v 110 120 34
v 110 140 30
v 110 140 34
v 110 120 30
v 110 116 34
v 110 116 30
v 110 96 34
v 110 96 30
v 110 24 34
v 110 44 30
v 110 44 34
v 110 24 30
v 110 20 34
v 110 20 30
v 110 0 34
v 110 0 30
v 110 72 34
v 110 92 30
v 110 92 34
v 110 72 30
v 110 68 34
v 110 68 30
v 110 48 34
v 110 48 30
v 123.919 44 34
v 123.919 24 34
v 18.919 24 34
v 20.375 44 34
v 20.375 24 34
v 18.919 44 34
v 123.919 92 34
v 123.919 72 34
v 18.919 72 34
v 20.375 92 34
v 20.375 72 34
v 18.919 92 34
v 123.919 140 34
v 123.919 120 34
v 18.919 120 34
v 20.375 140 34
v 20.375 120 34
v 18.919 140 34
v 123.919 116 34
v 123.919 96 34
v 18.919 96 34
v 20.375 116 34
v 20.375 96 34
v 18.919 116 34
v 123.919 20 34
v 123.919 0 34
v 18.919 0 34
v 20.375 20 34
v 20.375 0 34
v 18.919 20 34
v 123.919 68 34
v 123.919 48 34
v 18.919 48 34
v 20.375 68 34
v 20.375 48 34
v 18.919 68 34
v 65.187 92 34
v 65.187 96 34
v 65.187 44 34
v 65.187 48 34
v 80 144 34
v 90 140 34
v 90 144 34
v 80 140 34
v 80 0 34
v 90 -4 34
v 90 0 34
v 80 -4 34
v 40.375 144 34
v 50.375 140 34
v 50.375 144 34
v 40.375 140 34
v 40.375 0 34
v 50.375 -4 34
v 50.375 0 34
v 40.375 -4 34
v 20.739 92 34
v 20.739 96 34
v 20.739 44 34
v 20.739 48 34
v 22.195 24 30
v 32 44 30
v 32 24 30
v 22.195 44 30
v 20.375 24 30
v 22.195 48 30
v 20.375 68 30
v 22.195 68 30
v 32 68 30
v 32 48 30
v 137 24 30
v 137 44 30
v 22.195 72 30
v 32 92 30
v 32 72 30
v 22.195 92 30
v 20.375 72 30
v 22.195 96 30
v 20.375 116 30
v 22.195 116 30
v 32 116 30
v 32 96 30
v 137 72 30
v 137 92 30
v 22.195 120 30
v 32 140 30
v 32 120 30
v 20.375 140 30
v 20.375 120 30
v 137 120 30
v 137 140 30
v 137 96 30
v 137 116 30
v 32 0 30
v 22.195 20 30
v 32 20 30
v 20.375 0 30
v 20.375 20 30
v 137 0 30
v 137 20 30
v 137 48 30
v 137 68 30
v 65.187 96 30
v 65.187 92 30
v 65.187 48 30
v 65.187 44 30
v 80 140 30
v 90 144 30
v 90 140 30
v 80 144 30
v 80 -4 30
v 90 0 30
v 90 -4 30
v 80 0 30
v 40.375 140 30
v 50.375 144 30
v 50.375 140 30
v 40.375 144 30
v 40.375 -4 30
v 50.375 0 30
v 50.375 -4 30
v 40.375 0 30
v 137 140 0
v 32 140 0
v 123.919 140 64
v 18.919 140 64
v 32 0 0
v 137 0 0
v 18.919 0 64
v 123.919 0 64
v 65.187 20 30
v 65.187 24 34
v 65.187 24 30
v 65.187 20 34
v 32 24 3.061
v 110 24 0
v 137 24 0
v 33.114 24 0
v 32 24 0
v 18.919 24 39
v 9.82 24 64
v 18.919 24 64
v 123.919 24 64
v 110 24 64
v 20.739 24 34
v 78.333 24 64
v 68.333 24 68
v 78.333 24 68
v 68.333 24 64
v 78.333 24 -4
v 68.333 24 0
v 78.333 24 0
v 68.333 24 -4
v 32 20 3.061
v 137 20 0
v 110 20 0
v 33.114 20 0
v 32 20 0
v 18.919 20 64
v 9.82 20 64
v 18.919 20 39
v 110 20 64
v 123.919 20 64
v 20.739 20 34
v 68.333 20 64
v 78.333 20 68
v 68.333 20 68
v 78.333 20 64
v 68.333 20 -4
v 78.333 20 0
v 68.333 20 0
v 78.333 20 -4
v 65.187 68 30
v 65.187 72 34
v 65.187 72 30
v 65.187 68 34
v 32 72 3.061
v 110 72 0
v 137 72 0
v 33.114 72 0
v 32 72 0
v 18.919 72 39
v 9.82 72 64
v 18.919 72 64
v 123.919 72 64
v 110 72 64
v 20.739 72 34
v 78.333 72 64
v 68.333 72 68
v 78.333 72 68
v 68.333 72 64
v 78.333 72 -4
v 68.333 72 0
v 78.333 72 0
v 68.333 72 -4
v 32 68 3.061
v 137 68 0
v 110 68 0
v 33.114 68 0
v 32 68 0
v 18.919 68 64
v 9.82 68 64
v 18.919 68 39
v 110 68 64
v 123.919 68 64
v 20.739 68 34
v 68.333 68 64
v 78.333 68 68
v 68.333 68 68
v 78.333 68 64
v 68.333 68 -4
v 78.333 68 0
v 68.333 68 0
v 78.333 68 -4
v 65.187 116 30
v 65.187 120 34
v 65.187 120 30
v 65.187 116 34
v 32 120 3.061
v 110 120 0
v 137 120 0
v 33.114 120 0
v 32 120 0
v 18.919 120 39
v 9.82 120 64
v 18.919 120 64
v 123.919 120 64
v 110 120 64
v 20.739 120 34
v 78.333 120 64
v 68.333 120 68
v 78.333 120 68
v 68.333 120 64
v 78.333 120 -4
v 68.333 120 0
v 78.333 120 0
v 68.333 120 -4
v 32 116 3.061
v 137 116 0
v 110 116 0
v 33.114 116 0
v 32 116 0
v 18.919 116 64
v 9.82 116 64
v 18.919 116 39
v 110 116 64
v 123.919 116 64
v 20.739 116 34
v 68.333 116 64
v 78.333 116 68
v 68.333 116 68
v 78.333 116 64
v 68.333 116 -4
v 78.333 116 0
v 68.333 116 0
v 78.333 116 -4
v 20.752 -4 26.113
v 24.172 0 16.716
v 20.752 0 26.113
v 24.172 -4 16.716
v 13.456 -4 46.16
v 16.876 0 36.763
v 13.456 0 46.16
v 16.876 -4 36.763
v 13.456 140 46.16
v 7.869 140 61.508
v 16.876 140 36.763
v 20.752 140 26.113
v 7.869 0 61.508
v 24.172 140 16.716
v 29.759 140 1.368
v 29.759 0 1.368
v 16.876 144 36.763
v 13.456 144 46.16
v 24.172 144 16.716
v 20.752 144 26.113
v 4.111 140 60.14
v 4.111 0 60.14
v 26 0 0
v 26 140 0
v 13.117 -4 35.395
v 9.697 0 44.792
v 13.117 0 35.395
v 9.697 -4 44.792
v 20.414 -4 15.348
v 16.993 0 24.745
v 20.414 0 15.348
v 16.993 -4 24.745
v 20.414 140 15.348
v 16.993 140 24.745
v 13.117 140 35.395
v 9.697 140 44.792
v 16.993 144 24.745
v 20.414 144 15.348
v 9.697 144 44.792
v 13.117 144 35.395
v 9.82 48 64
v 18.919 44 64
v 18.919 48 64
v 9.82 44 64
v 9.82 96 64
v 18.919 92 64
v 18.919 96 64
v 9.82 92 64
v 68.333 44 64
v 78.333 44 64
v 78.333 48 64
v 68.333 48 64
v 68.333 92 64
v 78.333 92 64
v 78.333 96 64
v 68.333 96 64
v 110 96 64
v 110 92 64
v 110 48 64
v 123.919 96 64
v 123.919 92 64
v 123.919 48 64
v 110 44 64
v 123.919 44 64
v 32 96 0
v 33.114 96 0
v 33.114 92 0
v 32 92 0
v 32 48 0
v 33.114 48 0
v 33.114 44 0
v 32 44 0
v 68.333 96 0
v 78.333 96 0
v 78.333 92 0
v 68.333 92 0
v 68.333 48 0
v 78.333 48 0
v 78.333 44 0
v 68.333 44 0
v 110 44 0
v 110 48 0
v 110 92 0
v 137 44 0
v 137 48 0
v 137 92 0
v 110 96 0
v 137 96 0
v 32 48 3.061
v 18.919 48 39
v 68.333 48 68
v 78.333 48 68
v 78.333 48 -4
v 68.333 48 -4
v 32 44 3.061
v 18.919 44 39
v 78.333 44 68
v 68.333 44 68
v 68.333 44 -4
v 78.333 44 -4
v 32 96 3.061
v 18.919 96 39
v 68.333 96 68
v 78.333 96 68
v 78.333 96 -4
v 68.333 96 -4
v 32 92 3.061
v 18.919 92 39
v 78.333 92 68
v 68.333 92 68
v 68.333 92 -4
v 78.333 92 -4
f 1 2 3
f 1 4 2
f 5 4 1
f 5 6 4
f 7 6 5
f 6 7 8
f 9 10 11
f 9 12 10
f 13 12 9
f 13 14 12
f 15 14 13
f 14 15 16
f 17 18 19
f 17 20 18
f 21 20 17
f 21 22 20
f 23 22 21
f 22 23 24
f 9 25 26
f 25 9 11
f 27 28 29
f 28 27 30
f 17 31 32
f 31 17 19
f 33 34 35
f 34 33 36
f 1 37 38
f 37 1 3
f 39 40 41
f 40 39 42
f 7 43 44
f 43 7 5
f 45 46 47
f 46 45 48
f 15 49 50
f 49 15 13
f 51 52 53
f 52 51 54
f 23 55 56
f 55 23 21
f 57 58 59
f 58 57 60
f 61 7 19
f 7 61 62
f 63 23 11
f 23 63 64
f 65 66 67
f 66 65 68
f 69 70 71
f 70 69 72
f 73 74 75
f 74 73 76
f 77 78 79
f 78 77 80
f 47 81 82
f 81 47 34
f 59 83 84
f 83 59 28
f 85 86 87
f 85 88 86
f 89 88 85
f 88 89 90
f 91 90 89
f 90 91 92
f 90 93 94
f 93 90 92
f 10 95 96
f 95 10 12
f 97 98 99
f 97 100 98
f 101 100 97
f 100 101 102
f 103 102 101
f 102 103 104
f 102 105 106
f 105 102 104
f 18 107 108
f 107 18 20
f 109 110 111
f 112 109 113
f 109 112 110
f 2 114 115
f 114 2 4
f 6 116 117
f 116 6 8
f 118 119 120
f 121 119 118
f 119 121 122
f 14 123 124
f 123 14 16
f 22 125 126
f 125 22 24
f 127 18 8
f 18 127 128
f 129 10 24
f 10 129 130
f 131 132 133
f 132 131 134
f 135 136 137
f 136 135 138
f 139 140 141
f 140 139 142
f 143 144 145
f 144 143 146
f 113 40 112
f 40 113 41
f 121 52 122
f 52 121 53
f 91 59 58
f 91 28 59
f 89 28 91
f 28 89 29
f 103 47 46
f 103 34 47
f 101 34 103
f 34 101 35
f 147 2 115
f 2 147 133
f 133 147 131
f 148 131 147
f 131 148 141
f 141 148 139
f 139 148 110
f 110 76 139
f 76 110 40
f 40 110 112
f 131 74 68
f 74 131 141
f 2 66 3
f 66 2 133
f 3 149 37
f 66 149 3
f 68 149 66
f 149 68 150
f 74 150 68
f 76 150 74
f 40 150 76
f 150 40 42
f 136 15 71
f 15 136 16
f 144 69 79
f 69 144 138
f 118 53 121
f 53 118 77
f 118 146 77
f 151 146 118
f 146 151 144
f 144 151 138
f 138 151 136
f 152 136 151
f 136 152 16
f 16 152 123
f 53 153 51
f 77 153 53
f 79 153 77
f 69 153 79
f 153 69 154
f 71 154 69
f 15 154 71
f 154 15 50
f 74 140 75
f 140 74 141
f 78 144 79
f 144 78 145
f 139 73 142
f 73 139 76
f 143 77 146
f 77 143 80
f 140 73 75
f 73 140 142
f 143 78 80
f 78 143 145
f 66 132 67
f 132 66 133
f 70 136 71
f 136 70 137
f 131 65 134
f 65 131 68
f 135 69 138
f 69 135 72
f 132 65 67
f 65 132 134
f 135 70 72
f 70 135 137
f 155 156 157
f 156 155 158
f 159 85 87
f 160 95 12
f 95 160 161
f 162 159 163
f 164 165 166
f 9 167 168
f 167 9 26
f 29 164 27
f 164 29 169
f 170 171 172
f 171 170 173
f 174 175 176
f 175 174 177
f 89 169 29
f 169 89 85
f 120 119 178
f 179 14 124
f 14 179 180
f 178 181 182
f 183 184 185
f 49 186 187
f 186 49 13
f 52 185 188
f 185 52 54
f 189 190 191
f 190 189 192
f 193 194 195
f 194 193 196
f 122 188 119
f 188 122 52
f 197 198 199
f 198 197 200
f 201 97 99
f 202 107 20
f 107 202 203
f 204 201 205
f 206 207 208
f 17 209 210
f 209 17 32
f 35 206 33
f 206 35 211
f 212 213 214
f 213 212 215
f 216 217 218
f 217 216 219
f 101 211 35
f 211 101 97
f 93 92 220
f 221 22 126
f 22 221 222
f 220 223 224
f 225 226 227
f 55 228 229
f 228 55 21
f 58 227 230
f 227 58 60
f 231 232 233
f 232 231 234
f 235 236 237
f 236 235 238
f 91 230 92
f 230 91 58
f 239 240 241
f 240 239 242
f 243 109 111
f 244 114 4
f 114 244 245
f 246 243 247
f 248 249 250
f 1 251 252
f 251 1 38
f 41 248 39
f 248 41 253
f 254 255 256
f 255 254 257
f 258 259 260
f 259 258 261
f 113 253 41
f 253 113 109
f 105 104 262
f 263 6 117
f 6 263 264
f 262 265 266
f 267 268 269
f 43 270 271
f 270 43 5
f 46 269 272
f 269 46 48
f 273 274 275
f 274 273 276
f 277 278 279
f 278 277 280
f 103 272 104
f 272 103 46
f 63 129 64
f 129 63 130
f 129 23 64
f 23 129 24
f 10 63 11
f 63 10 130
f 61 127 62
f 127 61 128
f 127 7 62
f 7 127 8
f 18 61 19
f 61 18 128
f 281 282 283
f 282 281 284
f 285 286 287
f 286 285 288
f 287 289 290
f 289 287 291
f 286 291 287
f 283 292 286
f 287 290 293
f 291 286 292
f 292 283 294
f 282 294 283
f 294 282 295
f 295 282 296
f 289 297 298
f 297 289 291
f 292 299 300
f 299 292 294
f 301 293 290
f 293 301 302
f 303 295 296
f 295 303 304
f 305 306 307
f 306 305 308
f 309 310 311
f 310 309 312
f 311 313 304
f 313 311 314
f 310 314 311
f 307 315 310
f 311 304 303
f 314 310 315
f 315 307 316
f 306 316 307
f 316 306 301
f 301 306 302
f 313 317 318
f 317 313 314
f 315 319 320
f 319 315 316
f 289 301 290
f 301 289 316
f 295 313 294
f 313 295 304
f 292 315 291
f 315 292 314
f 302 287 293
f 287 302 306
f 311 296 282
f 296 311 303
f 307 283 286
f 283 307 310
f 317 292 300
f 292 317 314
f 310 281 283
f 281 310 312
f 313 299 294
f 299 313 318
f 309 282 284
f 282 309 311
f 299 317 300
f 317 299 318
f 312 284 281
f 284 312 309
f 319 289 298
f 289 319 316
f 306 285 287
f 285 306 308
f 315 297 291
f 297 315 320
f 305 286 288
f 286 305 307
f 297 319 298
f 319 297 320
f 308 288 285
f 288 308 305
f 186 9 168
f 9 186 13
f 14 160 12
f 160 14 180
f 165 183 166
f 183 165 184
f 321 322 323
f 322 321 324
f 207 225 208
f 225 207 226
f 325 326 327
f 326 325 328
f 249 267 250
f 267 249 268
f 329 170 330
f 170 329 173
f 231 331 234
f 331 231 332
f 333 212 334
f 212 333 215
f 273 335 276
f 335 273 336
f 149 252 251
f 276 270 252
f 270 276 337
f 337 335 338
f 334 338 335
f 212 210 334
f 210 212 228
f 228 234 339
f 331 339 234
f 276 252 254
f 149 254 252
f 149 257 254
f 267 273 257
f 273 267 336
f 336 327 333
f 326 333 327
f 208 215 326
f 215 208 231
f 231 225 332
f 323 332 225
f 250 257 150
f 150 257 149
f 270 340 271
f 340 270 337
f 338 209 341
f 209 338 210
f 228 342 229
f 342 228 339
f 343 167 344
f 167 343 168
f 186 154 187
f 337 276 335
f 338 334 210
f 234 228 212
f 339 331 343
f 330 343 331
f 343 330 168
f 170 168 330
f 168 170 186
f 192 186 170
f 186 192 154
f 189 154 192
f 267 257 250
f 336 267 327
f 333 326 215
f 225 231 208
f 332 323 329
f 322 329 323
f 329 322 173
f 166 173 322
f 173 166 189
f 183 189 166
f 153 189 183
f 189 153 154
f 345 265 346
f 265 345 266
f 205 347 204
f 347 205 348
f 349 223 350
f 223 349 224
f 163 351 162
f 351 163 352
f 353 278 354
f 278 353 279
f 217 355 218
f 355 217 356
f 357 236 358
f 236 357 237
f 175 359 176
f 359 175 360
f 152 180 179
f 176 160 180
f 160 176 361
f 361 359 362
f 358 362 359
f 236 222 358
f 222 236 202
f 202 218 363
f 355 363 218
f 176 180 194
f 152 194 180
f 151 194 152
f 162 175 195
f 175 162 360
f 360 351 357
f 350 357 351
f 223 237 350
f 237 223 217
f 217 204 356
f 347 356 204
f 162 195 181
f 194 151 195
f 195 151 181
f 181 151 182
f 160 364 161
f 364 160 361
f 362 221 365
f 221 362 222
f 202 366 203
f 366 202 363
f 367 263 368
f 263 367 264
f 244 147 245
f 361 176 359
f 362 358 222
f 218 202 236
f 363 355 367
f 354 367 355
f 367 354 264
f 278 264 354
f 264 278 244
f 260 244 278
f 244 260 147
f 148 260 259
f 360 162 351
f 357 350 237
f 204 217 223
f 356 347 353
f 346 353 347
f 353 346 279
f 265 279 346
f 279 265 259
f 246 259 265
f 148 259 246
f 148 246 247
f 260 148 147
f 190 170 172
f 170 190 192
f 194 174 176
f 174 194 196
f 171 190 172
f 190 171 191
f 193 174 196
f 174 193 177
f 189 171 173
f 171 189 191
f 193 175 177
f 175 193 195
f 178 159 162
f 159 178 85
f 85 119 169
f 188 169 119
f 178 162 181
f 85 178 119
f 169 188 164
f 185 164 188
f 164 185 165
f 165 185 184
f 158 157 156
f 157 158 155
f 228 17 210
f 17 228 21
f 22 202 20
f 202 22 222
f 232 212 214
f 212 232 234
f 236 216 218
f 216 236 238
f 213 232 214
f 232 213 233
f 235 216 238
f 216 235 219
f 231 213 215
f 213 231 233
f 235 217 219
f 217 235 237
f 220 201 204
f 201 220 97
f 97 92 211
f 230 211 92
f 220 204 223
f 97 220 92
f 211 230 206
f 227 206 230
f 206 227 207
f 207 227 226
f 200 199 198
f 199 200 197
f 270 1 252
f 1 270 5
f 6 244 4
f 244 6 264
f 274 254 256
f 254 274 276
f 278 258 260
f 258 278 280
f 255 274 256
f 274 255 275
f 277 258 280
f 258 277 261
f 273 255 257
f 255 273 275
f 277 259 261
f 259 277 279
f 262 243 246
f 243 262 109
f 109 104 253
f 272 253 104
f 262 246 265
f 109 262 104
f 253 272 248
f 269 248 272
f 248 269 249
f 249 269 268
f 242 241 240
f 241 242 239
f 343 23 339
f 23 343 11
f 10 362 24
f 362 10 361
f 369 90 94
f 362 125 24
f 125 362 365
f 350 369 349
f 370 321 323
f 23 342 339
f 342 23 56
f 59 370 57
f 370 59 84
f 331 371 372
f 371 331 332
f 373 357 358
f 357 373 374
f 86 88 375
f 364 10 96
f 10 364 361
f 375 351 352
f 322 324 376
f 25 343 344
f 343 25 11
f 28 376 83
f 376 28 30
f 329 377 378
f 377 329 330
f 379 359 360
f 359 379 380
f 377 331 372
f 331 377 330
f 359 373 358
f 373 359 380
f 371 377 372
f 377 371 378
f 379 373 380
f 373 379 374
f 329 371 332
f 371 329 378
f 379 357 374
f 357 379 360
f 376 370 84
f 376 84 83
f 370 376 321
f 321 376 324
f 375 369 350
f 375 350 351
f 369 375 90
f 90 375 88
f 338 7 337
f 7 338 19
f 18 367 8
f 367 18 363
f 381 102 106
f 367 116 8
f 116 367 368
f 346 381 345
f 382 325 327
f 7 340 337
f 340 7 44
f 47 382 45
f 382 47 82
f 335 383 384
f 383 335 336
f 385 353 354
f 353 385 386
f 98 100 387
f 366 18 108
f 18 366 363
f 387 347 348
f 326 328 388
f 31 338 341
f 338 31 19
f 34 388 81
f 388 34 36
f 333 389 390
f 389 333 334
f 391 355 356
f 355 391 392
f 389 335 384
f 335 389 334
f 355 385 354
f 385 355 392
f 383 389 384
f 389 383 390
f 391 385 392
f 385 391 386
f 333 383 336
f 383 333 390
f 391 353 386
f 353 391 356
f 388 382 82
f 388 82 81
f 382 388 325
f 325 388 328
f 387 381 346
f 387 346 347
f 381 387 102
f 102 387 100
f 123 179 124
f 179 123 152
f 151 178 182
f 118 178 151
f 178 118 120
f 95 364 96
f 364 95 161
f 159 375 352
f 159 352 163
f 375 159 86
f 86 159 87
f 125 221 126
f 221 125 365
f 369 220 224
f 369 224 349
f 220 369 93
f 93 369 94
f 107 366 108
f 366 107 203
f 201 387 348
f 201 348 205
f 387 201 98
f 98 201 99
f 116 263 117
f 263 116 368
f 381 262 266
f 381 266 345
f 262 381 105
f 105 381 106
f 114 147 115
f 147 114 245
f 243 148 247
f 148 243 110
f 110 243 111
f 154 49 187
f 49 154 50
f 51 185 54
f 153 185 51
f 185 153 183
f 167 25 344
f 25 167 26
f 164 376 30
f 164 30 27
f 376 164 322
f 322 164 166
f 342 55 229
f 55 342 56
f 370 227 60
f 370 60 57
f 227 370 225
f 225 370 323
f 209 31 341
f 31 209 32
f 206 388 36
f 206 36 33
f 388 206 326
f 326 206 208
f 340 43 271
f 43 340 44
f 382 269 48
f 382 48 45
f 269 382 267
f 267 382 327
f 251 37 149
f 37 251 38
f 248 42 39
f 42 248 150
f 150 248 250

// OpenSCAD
// file: dimensions.scad
$thick_gap = 20;
$height_gap = 30;
$material_thickness = 4;
$slant_angle = 20;
$insideHeight = 110;
$outsetMargin = 10;
// file: box-inset.scad
include <./dimensions.scad>

// inside-slant offset -> 
offset = 8 + ($height_gap + $material_thickness) / tan (90-$slant_angle);
margin = 5;

insideWidth = 6 * $thick_gap + 5 * $material_thickness;

module horizontalPlank(height) {
  offsetted_height = height - offset;
  difference () {
    union() {
      //base
      cube([offsetted_height, insideWidth, $material_thickness]);
      // first set of wings
      translate([20, - $material_thickness, 0])
        cube([10, insideWidth + 2 * $material_thickness, $material_thickness]);
      // second set of wings
      translate([offsetted_height - 30, - $material_thickness, 0])
        cube([10, insideWidth + 2 * $material_thickness, $material_thickness]);
    }
    // first set of knotches
    for (i=[0:2]) {
      translate([- margin, $thick_gap + (i * 2 * ($thick_gap + $material_thickness)), - margin ])
        cube([offsetted_height / 2 + margin, $material_thickness, 2*margin +  $material_thickness]);
    }
    // second set of knotches
    for (i=[0:1]) {
      translate([offsetted_height / 2, 2 * $thick_gap + $material_thickness + (i * 2 * ($thick_gap + $material_thickness)), - margin ])
        cube([offsetted_height / 2 + margin, $material_thickness, 2*margin + $material_thickness]);
    }
  }
}

module insideSlant() {
  slantHeight = 2 * $height_gap + $material_thickness;
  union() {
    cube([$material_thickness, insideWidth, slantHeight]);
    translate([0, - $material_thickness, (slantHeight / 3) - 5])
    cube([$material_thickness, insideWidth + 2 * $material_thickness, 10]);
    translate([0, - $material_thickness, 2 * (slantHeight / 3) - 5])
    cube([$material_thickness, insideWidth + 2 * $material_thickness, 10]);
  }
}

module verticalSeparator(height, front_knotch = true) {
  offsetted_height = height - offset;
  separatorWidth = 2 * $height_gap + $material_thickness;

  base = 8 + margin;
  bottomOffset = base + (separatorWidth + 2 * margin) / tan(90-$slant_angle);

  // wedge cutout
  wedgePoints = [
    [0, 0, separatorWidth + 2 * margin], // 0
    [base, 0, separatorWidth + 2 * margin], // 1
    [bottomOffset, 0, 0], // 2
    [0, 0, 0], // 3
    [0, $material_thickness + 2 * margin, separatorWidth + 2 * margin], // 4
    [base, $material_thickness + 2 * margin, separatorWidth + 2 * margin], // 5
    [bottomOffset, $material_thickness + 2 * margin, 0], // 6
    [0, $material_thickness + 2 * margin, 0] // 7
  ];
  wedgeFaces = [
    [4, 5, 1, 0], // top
    [0, 1, 2, 3], // front
    [5, 6, 2, 1], // side
    [7, 6, 5, 4], // back
    [6, 7, 3, 2], // bottom
    [7, 4, 0, 3] // other side
  ];


  difference() {
    union() {
      cube([height, $material_thickness, separatorWidth]);
      translate([2 * height / 3 - 5, 0, - $material_thickness])
        cube([10, $material_thickness, separatorWidth + 2 * $material_thickness]);
    }
    translate([-margin, -margin, -margin])
      polyhedron(wedgePoints, wedgeFaces);
    if (front_knotch) {
      translate([offset + offsetted_height / 2, -margin, $height_gap])
        cube([offsetted_height / 2 + margin, $material_thickness + 2 * margin, $material_thickness]);
    } else {
      translate([offset - margin, -margin, $height_gap])
        cube([offsetted_height / 2 + margin, $material_thickness + 2 * margin, $material_thickness]);
    }
  }
}

module boxInset(height = 110) {
  translate([offset, 0, 30])
    horizontalPlank(height);

  translate([30 - $material_thickness, 0, 0])
  rotate([0, -20, 0])
    insideSlant();

  color("blue")
  translate([0, $thick_gap, 0])
    verticalSeparator(height);

  color("blue")
  translate([0, 3 * $thick_gap + 2 * $material_thickness, 0])
    verticalSeparator(height);

  color("blue")
  translate([0, 5 * $thick_gap + 4 * $material_thickness, 0])
    verticalSeparator(height);

  color("green")
  translate([0, 2 * $thick_gap + 1 * $material_thickness, 0])
    verticalSeparator(height);

  color("green")
  translate([0, 4 * $thick_gap + 3 * $material_thickness, 0])
    verticalSeparator(height);
}
boxInset();
// file: harmonica-body.scad
harmonicaHeight = 30;
harmonicaLength = 105;
HarmonicaThickness = 20;

module harmonicaBody() {
    cube([harmonicaLength, HarmonicaThickness, harmonicaHeight]);
}

rotate([0,90,0])
  translate([-harmonicaLength,0,0])
  harmonicaBody();
// main file
// Box body

/*   top 
 *   ____
 *  /    \ <- lid
 *  |    |
 *  |    | <- short sides: left & right
 *  |____| <- long sides: front & back
 *   ^ bottom
 *
 *
 *   base: left, right, front, back & bottom (i.e. all but lid)
 */


/*
 * DIMENSIONS
 *
 * Harmonica: 
 *  - roughly: 105 x 20 x 30
 *
 * harmonica stored along the X axis
 */

use <./harmonica-body.scad>

include <./box-inset.scad>
include <./dimensions.scad>

color("white") {
  translate([32, 0, 0])
  for (i=[0:5]) {
    translate([0, i * ($thick_gap + $material_thickness), 0])
      harmonicaBody();
  }
  translate([$height_gap/(tan(90-$slant_angle)) + 8, 0, $height_gap + $material_thickness])
  for (i=[0:5]) {
    translate([0, i * ($thick_gap + $material_thickness), 0])
      harmonicaBody();
  }
}
